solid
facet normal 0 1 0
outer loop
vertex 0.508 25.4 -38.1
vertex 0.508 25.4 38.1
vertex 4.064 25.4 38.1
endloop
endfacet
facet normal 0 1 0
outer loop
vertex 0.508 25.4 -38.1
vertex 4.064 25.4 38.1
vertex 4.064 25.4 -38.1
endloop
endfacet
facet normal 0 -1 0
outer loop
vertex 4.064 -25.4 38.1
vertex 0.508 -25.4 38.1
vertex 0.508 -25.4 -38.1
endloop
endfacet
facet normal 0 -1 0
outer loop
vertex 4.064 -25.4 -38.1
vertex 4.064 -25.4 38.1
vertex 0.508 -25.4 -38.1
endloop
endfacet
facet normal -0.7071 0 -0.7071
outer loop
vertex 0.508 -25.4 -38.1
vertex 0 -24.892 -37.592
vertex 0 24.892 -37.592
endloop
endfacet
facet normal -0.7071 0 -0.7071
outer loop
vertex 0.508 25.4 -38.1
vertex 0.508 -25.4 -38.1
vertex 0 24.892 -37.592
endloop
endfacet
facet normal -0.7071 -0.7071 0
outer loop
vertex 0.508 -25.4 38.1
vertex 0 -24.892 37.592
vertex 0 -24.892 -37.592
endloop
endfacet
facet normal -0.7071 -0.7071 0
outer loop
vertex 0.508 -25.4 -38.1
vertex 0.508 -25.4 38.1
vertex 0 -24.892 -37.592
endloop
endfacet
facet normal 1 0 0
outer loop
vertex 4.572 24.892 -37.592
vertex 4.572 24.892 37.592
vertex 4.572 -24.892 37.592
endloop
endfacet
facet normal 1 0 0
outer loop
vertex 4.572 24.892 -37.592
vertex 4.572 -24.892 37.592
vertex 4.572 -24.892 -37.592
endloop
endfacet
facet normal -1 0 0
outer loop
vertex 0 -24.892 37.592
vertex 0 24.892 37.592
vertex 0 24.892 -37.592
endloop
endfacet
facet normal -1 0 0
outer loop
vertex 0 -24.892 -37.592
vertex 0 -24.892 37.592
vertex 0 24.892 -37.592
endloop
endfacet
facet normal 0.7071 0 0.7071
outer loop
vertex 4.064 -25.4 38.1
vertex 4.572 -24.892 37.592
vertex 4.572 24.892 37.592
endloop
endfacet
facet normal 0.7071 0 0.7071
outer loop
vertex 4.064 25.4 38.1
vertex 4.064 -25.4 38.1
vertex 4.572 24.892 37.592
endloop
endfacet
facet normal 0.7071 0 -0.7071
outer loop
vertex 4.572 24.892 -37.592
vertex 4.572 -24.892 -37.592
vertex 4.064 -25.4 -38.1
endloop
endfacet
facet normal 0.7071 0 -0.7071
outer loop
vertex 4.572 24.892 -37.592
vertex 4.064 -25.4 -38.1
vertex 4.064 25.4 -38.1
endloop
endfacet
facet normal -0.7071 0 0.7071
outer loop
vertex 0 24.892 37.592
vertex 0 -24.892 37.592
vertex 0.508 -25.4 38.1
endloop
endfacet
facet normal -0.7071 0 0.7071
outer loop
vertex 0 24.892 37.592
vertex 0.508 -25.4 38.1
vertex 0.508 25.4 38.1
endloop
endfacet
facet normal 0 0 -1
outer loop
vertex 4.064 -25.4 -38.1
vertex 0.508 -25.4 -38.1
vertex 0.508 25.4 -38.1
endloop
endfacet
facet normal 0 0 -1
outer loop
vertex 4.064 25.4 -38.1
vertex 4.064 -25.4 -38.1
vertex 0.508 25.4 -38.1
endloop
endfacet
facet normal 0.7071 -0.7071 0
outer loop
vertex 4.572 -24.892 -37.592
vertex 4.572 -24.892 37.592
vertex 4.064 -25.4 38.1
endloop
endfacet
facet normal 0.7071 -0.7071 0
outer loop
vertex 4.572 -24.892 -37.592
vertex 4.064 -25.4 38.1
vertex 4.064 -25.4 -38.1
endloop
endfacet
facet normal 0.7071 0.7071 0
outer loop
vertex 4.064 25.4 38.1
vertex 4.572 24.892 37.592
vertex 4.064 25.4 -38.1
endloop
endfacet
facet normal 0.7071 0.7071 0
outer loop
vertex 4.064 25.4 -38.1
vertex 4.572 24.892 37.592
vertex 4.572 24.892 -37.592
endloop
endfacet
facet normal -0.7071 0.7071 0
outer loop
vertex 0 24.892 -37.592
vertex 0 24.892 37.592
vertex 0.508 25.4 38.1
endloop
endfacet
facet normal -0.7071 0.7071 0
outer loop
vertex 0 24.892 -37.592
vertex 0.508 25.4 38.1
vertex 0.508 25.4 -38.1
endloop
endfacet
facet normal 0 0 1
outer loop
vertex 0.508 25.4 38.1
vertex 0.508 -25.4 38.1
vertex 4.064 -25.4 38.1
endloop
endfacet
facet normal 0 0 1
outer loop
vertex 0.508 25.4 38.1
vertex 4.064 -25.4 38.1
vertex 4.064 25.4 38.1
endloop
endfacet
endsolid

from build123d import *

# Parameters (mm, degrees)
SKETCH1_W           = 76.2
SKETCH1_H           = 50.8
BOSS_EXTRUDE1_DEPTH = 4.572
CHAMFER1_SIZE       = 0.508


with BuildPart() as part:
    # Sketch1 → Boss-Extrude1 (new body)
    with BuildSketch(Plane(origin=(0, 0, 0), x_dir=(0, 0, -1), z_dir=(1, 0, 0))):
        Rectangle(SKETCH1_W, SKETCH1_H)
    extrude(amount=BOSS_EXTRUDE1_DEPTH)

    # Chamfer1
    chamfer1_edges = [part.edges().sort_by_distance(p)[0] for p in [
        (4.572, 0, -38.1),
        (4.572, 25.4, 0),
        (4.572, 0, 38.1),
        (0, 25.4, 0),
        (0, 0, -38.1),
        (0, -25.4, 0),
        (0, 0, 38.1),
        (4.572, -25.4, 0),
    ]]
    chamfer(chamfer1_edges, length=CHAMFER1_SIZE)


solid = part.part
